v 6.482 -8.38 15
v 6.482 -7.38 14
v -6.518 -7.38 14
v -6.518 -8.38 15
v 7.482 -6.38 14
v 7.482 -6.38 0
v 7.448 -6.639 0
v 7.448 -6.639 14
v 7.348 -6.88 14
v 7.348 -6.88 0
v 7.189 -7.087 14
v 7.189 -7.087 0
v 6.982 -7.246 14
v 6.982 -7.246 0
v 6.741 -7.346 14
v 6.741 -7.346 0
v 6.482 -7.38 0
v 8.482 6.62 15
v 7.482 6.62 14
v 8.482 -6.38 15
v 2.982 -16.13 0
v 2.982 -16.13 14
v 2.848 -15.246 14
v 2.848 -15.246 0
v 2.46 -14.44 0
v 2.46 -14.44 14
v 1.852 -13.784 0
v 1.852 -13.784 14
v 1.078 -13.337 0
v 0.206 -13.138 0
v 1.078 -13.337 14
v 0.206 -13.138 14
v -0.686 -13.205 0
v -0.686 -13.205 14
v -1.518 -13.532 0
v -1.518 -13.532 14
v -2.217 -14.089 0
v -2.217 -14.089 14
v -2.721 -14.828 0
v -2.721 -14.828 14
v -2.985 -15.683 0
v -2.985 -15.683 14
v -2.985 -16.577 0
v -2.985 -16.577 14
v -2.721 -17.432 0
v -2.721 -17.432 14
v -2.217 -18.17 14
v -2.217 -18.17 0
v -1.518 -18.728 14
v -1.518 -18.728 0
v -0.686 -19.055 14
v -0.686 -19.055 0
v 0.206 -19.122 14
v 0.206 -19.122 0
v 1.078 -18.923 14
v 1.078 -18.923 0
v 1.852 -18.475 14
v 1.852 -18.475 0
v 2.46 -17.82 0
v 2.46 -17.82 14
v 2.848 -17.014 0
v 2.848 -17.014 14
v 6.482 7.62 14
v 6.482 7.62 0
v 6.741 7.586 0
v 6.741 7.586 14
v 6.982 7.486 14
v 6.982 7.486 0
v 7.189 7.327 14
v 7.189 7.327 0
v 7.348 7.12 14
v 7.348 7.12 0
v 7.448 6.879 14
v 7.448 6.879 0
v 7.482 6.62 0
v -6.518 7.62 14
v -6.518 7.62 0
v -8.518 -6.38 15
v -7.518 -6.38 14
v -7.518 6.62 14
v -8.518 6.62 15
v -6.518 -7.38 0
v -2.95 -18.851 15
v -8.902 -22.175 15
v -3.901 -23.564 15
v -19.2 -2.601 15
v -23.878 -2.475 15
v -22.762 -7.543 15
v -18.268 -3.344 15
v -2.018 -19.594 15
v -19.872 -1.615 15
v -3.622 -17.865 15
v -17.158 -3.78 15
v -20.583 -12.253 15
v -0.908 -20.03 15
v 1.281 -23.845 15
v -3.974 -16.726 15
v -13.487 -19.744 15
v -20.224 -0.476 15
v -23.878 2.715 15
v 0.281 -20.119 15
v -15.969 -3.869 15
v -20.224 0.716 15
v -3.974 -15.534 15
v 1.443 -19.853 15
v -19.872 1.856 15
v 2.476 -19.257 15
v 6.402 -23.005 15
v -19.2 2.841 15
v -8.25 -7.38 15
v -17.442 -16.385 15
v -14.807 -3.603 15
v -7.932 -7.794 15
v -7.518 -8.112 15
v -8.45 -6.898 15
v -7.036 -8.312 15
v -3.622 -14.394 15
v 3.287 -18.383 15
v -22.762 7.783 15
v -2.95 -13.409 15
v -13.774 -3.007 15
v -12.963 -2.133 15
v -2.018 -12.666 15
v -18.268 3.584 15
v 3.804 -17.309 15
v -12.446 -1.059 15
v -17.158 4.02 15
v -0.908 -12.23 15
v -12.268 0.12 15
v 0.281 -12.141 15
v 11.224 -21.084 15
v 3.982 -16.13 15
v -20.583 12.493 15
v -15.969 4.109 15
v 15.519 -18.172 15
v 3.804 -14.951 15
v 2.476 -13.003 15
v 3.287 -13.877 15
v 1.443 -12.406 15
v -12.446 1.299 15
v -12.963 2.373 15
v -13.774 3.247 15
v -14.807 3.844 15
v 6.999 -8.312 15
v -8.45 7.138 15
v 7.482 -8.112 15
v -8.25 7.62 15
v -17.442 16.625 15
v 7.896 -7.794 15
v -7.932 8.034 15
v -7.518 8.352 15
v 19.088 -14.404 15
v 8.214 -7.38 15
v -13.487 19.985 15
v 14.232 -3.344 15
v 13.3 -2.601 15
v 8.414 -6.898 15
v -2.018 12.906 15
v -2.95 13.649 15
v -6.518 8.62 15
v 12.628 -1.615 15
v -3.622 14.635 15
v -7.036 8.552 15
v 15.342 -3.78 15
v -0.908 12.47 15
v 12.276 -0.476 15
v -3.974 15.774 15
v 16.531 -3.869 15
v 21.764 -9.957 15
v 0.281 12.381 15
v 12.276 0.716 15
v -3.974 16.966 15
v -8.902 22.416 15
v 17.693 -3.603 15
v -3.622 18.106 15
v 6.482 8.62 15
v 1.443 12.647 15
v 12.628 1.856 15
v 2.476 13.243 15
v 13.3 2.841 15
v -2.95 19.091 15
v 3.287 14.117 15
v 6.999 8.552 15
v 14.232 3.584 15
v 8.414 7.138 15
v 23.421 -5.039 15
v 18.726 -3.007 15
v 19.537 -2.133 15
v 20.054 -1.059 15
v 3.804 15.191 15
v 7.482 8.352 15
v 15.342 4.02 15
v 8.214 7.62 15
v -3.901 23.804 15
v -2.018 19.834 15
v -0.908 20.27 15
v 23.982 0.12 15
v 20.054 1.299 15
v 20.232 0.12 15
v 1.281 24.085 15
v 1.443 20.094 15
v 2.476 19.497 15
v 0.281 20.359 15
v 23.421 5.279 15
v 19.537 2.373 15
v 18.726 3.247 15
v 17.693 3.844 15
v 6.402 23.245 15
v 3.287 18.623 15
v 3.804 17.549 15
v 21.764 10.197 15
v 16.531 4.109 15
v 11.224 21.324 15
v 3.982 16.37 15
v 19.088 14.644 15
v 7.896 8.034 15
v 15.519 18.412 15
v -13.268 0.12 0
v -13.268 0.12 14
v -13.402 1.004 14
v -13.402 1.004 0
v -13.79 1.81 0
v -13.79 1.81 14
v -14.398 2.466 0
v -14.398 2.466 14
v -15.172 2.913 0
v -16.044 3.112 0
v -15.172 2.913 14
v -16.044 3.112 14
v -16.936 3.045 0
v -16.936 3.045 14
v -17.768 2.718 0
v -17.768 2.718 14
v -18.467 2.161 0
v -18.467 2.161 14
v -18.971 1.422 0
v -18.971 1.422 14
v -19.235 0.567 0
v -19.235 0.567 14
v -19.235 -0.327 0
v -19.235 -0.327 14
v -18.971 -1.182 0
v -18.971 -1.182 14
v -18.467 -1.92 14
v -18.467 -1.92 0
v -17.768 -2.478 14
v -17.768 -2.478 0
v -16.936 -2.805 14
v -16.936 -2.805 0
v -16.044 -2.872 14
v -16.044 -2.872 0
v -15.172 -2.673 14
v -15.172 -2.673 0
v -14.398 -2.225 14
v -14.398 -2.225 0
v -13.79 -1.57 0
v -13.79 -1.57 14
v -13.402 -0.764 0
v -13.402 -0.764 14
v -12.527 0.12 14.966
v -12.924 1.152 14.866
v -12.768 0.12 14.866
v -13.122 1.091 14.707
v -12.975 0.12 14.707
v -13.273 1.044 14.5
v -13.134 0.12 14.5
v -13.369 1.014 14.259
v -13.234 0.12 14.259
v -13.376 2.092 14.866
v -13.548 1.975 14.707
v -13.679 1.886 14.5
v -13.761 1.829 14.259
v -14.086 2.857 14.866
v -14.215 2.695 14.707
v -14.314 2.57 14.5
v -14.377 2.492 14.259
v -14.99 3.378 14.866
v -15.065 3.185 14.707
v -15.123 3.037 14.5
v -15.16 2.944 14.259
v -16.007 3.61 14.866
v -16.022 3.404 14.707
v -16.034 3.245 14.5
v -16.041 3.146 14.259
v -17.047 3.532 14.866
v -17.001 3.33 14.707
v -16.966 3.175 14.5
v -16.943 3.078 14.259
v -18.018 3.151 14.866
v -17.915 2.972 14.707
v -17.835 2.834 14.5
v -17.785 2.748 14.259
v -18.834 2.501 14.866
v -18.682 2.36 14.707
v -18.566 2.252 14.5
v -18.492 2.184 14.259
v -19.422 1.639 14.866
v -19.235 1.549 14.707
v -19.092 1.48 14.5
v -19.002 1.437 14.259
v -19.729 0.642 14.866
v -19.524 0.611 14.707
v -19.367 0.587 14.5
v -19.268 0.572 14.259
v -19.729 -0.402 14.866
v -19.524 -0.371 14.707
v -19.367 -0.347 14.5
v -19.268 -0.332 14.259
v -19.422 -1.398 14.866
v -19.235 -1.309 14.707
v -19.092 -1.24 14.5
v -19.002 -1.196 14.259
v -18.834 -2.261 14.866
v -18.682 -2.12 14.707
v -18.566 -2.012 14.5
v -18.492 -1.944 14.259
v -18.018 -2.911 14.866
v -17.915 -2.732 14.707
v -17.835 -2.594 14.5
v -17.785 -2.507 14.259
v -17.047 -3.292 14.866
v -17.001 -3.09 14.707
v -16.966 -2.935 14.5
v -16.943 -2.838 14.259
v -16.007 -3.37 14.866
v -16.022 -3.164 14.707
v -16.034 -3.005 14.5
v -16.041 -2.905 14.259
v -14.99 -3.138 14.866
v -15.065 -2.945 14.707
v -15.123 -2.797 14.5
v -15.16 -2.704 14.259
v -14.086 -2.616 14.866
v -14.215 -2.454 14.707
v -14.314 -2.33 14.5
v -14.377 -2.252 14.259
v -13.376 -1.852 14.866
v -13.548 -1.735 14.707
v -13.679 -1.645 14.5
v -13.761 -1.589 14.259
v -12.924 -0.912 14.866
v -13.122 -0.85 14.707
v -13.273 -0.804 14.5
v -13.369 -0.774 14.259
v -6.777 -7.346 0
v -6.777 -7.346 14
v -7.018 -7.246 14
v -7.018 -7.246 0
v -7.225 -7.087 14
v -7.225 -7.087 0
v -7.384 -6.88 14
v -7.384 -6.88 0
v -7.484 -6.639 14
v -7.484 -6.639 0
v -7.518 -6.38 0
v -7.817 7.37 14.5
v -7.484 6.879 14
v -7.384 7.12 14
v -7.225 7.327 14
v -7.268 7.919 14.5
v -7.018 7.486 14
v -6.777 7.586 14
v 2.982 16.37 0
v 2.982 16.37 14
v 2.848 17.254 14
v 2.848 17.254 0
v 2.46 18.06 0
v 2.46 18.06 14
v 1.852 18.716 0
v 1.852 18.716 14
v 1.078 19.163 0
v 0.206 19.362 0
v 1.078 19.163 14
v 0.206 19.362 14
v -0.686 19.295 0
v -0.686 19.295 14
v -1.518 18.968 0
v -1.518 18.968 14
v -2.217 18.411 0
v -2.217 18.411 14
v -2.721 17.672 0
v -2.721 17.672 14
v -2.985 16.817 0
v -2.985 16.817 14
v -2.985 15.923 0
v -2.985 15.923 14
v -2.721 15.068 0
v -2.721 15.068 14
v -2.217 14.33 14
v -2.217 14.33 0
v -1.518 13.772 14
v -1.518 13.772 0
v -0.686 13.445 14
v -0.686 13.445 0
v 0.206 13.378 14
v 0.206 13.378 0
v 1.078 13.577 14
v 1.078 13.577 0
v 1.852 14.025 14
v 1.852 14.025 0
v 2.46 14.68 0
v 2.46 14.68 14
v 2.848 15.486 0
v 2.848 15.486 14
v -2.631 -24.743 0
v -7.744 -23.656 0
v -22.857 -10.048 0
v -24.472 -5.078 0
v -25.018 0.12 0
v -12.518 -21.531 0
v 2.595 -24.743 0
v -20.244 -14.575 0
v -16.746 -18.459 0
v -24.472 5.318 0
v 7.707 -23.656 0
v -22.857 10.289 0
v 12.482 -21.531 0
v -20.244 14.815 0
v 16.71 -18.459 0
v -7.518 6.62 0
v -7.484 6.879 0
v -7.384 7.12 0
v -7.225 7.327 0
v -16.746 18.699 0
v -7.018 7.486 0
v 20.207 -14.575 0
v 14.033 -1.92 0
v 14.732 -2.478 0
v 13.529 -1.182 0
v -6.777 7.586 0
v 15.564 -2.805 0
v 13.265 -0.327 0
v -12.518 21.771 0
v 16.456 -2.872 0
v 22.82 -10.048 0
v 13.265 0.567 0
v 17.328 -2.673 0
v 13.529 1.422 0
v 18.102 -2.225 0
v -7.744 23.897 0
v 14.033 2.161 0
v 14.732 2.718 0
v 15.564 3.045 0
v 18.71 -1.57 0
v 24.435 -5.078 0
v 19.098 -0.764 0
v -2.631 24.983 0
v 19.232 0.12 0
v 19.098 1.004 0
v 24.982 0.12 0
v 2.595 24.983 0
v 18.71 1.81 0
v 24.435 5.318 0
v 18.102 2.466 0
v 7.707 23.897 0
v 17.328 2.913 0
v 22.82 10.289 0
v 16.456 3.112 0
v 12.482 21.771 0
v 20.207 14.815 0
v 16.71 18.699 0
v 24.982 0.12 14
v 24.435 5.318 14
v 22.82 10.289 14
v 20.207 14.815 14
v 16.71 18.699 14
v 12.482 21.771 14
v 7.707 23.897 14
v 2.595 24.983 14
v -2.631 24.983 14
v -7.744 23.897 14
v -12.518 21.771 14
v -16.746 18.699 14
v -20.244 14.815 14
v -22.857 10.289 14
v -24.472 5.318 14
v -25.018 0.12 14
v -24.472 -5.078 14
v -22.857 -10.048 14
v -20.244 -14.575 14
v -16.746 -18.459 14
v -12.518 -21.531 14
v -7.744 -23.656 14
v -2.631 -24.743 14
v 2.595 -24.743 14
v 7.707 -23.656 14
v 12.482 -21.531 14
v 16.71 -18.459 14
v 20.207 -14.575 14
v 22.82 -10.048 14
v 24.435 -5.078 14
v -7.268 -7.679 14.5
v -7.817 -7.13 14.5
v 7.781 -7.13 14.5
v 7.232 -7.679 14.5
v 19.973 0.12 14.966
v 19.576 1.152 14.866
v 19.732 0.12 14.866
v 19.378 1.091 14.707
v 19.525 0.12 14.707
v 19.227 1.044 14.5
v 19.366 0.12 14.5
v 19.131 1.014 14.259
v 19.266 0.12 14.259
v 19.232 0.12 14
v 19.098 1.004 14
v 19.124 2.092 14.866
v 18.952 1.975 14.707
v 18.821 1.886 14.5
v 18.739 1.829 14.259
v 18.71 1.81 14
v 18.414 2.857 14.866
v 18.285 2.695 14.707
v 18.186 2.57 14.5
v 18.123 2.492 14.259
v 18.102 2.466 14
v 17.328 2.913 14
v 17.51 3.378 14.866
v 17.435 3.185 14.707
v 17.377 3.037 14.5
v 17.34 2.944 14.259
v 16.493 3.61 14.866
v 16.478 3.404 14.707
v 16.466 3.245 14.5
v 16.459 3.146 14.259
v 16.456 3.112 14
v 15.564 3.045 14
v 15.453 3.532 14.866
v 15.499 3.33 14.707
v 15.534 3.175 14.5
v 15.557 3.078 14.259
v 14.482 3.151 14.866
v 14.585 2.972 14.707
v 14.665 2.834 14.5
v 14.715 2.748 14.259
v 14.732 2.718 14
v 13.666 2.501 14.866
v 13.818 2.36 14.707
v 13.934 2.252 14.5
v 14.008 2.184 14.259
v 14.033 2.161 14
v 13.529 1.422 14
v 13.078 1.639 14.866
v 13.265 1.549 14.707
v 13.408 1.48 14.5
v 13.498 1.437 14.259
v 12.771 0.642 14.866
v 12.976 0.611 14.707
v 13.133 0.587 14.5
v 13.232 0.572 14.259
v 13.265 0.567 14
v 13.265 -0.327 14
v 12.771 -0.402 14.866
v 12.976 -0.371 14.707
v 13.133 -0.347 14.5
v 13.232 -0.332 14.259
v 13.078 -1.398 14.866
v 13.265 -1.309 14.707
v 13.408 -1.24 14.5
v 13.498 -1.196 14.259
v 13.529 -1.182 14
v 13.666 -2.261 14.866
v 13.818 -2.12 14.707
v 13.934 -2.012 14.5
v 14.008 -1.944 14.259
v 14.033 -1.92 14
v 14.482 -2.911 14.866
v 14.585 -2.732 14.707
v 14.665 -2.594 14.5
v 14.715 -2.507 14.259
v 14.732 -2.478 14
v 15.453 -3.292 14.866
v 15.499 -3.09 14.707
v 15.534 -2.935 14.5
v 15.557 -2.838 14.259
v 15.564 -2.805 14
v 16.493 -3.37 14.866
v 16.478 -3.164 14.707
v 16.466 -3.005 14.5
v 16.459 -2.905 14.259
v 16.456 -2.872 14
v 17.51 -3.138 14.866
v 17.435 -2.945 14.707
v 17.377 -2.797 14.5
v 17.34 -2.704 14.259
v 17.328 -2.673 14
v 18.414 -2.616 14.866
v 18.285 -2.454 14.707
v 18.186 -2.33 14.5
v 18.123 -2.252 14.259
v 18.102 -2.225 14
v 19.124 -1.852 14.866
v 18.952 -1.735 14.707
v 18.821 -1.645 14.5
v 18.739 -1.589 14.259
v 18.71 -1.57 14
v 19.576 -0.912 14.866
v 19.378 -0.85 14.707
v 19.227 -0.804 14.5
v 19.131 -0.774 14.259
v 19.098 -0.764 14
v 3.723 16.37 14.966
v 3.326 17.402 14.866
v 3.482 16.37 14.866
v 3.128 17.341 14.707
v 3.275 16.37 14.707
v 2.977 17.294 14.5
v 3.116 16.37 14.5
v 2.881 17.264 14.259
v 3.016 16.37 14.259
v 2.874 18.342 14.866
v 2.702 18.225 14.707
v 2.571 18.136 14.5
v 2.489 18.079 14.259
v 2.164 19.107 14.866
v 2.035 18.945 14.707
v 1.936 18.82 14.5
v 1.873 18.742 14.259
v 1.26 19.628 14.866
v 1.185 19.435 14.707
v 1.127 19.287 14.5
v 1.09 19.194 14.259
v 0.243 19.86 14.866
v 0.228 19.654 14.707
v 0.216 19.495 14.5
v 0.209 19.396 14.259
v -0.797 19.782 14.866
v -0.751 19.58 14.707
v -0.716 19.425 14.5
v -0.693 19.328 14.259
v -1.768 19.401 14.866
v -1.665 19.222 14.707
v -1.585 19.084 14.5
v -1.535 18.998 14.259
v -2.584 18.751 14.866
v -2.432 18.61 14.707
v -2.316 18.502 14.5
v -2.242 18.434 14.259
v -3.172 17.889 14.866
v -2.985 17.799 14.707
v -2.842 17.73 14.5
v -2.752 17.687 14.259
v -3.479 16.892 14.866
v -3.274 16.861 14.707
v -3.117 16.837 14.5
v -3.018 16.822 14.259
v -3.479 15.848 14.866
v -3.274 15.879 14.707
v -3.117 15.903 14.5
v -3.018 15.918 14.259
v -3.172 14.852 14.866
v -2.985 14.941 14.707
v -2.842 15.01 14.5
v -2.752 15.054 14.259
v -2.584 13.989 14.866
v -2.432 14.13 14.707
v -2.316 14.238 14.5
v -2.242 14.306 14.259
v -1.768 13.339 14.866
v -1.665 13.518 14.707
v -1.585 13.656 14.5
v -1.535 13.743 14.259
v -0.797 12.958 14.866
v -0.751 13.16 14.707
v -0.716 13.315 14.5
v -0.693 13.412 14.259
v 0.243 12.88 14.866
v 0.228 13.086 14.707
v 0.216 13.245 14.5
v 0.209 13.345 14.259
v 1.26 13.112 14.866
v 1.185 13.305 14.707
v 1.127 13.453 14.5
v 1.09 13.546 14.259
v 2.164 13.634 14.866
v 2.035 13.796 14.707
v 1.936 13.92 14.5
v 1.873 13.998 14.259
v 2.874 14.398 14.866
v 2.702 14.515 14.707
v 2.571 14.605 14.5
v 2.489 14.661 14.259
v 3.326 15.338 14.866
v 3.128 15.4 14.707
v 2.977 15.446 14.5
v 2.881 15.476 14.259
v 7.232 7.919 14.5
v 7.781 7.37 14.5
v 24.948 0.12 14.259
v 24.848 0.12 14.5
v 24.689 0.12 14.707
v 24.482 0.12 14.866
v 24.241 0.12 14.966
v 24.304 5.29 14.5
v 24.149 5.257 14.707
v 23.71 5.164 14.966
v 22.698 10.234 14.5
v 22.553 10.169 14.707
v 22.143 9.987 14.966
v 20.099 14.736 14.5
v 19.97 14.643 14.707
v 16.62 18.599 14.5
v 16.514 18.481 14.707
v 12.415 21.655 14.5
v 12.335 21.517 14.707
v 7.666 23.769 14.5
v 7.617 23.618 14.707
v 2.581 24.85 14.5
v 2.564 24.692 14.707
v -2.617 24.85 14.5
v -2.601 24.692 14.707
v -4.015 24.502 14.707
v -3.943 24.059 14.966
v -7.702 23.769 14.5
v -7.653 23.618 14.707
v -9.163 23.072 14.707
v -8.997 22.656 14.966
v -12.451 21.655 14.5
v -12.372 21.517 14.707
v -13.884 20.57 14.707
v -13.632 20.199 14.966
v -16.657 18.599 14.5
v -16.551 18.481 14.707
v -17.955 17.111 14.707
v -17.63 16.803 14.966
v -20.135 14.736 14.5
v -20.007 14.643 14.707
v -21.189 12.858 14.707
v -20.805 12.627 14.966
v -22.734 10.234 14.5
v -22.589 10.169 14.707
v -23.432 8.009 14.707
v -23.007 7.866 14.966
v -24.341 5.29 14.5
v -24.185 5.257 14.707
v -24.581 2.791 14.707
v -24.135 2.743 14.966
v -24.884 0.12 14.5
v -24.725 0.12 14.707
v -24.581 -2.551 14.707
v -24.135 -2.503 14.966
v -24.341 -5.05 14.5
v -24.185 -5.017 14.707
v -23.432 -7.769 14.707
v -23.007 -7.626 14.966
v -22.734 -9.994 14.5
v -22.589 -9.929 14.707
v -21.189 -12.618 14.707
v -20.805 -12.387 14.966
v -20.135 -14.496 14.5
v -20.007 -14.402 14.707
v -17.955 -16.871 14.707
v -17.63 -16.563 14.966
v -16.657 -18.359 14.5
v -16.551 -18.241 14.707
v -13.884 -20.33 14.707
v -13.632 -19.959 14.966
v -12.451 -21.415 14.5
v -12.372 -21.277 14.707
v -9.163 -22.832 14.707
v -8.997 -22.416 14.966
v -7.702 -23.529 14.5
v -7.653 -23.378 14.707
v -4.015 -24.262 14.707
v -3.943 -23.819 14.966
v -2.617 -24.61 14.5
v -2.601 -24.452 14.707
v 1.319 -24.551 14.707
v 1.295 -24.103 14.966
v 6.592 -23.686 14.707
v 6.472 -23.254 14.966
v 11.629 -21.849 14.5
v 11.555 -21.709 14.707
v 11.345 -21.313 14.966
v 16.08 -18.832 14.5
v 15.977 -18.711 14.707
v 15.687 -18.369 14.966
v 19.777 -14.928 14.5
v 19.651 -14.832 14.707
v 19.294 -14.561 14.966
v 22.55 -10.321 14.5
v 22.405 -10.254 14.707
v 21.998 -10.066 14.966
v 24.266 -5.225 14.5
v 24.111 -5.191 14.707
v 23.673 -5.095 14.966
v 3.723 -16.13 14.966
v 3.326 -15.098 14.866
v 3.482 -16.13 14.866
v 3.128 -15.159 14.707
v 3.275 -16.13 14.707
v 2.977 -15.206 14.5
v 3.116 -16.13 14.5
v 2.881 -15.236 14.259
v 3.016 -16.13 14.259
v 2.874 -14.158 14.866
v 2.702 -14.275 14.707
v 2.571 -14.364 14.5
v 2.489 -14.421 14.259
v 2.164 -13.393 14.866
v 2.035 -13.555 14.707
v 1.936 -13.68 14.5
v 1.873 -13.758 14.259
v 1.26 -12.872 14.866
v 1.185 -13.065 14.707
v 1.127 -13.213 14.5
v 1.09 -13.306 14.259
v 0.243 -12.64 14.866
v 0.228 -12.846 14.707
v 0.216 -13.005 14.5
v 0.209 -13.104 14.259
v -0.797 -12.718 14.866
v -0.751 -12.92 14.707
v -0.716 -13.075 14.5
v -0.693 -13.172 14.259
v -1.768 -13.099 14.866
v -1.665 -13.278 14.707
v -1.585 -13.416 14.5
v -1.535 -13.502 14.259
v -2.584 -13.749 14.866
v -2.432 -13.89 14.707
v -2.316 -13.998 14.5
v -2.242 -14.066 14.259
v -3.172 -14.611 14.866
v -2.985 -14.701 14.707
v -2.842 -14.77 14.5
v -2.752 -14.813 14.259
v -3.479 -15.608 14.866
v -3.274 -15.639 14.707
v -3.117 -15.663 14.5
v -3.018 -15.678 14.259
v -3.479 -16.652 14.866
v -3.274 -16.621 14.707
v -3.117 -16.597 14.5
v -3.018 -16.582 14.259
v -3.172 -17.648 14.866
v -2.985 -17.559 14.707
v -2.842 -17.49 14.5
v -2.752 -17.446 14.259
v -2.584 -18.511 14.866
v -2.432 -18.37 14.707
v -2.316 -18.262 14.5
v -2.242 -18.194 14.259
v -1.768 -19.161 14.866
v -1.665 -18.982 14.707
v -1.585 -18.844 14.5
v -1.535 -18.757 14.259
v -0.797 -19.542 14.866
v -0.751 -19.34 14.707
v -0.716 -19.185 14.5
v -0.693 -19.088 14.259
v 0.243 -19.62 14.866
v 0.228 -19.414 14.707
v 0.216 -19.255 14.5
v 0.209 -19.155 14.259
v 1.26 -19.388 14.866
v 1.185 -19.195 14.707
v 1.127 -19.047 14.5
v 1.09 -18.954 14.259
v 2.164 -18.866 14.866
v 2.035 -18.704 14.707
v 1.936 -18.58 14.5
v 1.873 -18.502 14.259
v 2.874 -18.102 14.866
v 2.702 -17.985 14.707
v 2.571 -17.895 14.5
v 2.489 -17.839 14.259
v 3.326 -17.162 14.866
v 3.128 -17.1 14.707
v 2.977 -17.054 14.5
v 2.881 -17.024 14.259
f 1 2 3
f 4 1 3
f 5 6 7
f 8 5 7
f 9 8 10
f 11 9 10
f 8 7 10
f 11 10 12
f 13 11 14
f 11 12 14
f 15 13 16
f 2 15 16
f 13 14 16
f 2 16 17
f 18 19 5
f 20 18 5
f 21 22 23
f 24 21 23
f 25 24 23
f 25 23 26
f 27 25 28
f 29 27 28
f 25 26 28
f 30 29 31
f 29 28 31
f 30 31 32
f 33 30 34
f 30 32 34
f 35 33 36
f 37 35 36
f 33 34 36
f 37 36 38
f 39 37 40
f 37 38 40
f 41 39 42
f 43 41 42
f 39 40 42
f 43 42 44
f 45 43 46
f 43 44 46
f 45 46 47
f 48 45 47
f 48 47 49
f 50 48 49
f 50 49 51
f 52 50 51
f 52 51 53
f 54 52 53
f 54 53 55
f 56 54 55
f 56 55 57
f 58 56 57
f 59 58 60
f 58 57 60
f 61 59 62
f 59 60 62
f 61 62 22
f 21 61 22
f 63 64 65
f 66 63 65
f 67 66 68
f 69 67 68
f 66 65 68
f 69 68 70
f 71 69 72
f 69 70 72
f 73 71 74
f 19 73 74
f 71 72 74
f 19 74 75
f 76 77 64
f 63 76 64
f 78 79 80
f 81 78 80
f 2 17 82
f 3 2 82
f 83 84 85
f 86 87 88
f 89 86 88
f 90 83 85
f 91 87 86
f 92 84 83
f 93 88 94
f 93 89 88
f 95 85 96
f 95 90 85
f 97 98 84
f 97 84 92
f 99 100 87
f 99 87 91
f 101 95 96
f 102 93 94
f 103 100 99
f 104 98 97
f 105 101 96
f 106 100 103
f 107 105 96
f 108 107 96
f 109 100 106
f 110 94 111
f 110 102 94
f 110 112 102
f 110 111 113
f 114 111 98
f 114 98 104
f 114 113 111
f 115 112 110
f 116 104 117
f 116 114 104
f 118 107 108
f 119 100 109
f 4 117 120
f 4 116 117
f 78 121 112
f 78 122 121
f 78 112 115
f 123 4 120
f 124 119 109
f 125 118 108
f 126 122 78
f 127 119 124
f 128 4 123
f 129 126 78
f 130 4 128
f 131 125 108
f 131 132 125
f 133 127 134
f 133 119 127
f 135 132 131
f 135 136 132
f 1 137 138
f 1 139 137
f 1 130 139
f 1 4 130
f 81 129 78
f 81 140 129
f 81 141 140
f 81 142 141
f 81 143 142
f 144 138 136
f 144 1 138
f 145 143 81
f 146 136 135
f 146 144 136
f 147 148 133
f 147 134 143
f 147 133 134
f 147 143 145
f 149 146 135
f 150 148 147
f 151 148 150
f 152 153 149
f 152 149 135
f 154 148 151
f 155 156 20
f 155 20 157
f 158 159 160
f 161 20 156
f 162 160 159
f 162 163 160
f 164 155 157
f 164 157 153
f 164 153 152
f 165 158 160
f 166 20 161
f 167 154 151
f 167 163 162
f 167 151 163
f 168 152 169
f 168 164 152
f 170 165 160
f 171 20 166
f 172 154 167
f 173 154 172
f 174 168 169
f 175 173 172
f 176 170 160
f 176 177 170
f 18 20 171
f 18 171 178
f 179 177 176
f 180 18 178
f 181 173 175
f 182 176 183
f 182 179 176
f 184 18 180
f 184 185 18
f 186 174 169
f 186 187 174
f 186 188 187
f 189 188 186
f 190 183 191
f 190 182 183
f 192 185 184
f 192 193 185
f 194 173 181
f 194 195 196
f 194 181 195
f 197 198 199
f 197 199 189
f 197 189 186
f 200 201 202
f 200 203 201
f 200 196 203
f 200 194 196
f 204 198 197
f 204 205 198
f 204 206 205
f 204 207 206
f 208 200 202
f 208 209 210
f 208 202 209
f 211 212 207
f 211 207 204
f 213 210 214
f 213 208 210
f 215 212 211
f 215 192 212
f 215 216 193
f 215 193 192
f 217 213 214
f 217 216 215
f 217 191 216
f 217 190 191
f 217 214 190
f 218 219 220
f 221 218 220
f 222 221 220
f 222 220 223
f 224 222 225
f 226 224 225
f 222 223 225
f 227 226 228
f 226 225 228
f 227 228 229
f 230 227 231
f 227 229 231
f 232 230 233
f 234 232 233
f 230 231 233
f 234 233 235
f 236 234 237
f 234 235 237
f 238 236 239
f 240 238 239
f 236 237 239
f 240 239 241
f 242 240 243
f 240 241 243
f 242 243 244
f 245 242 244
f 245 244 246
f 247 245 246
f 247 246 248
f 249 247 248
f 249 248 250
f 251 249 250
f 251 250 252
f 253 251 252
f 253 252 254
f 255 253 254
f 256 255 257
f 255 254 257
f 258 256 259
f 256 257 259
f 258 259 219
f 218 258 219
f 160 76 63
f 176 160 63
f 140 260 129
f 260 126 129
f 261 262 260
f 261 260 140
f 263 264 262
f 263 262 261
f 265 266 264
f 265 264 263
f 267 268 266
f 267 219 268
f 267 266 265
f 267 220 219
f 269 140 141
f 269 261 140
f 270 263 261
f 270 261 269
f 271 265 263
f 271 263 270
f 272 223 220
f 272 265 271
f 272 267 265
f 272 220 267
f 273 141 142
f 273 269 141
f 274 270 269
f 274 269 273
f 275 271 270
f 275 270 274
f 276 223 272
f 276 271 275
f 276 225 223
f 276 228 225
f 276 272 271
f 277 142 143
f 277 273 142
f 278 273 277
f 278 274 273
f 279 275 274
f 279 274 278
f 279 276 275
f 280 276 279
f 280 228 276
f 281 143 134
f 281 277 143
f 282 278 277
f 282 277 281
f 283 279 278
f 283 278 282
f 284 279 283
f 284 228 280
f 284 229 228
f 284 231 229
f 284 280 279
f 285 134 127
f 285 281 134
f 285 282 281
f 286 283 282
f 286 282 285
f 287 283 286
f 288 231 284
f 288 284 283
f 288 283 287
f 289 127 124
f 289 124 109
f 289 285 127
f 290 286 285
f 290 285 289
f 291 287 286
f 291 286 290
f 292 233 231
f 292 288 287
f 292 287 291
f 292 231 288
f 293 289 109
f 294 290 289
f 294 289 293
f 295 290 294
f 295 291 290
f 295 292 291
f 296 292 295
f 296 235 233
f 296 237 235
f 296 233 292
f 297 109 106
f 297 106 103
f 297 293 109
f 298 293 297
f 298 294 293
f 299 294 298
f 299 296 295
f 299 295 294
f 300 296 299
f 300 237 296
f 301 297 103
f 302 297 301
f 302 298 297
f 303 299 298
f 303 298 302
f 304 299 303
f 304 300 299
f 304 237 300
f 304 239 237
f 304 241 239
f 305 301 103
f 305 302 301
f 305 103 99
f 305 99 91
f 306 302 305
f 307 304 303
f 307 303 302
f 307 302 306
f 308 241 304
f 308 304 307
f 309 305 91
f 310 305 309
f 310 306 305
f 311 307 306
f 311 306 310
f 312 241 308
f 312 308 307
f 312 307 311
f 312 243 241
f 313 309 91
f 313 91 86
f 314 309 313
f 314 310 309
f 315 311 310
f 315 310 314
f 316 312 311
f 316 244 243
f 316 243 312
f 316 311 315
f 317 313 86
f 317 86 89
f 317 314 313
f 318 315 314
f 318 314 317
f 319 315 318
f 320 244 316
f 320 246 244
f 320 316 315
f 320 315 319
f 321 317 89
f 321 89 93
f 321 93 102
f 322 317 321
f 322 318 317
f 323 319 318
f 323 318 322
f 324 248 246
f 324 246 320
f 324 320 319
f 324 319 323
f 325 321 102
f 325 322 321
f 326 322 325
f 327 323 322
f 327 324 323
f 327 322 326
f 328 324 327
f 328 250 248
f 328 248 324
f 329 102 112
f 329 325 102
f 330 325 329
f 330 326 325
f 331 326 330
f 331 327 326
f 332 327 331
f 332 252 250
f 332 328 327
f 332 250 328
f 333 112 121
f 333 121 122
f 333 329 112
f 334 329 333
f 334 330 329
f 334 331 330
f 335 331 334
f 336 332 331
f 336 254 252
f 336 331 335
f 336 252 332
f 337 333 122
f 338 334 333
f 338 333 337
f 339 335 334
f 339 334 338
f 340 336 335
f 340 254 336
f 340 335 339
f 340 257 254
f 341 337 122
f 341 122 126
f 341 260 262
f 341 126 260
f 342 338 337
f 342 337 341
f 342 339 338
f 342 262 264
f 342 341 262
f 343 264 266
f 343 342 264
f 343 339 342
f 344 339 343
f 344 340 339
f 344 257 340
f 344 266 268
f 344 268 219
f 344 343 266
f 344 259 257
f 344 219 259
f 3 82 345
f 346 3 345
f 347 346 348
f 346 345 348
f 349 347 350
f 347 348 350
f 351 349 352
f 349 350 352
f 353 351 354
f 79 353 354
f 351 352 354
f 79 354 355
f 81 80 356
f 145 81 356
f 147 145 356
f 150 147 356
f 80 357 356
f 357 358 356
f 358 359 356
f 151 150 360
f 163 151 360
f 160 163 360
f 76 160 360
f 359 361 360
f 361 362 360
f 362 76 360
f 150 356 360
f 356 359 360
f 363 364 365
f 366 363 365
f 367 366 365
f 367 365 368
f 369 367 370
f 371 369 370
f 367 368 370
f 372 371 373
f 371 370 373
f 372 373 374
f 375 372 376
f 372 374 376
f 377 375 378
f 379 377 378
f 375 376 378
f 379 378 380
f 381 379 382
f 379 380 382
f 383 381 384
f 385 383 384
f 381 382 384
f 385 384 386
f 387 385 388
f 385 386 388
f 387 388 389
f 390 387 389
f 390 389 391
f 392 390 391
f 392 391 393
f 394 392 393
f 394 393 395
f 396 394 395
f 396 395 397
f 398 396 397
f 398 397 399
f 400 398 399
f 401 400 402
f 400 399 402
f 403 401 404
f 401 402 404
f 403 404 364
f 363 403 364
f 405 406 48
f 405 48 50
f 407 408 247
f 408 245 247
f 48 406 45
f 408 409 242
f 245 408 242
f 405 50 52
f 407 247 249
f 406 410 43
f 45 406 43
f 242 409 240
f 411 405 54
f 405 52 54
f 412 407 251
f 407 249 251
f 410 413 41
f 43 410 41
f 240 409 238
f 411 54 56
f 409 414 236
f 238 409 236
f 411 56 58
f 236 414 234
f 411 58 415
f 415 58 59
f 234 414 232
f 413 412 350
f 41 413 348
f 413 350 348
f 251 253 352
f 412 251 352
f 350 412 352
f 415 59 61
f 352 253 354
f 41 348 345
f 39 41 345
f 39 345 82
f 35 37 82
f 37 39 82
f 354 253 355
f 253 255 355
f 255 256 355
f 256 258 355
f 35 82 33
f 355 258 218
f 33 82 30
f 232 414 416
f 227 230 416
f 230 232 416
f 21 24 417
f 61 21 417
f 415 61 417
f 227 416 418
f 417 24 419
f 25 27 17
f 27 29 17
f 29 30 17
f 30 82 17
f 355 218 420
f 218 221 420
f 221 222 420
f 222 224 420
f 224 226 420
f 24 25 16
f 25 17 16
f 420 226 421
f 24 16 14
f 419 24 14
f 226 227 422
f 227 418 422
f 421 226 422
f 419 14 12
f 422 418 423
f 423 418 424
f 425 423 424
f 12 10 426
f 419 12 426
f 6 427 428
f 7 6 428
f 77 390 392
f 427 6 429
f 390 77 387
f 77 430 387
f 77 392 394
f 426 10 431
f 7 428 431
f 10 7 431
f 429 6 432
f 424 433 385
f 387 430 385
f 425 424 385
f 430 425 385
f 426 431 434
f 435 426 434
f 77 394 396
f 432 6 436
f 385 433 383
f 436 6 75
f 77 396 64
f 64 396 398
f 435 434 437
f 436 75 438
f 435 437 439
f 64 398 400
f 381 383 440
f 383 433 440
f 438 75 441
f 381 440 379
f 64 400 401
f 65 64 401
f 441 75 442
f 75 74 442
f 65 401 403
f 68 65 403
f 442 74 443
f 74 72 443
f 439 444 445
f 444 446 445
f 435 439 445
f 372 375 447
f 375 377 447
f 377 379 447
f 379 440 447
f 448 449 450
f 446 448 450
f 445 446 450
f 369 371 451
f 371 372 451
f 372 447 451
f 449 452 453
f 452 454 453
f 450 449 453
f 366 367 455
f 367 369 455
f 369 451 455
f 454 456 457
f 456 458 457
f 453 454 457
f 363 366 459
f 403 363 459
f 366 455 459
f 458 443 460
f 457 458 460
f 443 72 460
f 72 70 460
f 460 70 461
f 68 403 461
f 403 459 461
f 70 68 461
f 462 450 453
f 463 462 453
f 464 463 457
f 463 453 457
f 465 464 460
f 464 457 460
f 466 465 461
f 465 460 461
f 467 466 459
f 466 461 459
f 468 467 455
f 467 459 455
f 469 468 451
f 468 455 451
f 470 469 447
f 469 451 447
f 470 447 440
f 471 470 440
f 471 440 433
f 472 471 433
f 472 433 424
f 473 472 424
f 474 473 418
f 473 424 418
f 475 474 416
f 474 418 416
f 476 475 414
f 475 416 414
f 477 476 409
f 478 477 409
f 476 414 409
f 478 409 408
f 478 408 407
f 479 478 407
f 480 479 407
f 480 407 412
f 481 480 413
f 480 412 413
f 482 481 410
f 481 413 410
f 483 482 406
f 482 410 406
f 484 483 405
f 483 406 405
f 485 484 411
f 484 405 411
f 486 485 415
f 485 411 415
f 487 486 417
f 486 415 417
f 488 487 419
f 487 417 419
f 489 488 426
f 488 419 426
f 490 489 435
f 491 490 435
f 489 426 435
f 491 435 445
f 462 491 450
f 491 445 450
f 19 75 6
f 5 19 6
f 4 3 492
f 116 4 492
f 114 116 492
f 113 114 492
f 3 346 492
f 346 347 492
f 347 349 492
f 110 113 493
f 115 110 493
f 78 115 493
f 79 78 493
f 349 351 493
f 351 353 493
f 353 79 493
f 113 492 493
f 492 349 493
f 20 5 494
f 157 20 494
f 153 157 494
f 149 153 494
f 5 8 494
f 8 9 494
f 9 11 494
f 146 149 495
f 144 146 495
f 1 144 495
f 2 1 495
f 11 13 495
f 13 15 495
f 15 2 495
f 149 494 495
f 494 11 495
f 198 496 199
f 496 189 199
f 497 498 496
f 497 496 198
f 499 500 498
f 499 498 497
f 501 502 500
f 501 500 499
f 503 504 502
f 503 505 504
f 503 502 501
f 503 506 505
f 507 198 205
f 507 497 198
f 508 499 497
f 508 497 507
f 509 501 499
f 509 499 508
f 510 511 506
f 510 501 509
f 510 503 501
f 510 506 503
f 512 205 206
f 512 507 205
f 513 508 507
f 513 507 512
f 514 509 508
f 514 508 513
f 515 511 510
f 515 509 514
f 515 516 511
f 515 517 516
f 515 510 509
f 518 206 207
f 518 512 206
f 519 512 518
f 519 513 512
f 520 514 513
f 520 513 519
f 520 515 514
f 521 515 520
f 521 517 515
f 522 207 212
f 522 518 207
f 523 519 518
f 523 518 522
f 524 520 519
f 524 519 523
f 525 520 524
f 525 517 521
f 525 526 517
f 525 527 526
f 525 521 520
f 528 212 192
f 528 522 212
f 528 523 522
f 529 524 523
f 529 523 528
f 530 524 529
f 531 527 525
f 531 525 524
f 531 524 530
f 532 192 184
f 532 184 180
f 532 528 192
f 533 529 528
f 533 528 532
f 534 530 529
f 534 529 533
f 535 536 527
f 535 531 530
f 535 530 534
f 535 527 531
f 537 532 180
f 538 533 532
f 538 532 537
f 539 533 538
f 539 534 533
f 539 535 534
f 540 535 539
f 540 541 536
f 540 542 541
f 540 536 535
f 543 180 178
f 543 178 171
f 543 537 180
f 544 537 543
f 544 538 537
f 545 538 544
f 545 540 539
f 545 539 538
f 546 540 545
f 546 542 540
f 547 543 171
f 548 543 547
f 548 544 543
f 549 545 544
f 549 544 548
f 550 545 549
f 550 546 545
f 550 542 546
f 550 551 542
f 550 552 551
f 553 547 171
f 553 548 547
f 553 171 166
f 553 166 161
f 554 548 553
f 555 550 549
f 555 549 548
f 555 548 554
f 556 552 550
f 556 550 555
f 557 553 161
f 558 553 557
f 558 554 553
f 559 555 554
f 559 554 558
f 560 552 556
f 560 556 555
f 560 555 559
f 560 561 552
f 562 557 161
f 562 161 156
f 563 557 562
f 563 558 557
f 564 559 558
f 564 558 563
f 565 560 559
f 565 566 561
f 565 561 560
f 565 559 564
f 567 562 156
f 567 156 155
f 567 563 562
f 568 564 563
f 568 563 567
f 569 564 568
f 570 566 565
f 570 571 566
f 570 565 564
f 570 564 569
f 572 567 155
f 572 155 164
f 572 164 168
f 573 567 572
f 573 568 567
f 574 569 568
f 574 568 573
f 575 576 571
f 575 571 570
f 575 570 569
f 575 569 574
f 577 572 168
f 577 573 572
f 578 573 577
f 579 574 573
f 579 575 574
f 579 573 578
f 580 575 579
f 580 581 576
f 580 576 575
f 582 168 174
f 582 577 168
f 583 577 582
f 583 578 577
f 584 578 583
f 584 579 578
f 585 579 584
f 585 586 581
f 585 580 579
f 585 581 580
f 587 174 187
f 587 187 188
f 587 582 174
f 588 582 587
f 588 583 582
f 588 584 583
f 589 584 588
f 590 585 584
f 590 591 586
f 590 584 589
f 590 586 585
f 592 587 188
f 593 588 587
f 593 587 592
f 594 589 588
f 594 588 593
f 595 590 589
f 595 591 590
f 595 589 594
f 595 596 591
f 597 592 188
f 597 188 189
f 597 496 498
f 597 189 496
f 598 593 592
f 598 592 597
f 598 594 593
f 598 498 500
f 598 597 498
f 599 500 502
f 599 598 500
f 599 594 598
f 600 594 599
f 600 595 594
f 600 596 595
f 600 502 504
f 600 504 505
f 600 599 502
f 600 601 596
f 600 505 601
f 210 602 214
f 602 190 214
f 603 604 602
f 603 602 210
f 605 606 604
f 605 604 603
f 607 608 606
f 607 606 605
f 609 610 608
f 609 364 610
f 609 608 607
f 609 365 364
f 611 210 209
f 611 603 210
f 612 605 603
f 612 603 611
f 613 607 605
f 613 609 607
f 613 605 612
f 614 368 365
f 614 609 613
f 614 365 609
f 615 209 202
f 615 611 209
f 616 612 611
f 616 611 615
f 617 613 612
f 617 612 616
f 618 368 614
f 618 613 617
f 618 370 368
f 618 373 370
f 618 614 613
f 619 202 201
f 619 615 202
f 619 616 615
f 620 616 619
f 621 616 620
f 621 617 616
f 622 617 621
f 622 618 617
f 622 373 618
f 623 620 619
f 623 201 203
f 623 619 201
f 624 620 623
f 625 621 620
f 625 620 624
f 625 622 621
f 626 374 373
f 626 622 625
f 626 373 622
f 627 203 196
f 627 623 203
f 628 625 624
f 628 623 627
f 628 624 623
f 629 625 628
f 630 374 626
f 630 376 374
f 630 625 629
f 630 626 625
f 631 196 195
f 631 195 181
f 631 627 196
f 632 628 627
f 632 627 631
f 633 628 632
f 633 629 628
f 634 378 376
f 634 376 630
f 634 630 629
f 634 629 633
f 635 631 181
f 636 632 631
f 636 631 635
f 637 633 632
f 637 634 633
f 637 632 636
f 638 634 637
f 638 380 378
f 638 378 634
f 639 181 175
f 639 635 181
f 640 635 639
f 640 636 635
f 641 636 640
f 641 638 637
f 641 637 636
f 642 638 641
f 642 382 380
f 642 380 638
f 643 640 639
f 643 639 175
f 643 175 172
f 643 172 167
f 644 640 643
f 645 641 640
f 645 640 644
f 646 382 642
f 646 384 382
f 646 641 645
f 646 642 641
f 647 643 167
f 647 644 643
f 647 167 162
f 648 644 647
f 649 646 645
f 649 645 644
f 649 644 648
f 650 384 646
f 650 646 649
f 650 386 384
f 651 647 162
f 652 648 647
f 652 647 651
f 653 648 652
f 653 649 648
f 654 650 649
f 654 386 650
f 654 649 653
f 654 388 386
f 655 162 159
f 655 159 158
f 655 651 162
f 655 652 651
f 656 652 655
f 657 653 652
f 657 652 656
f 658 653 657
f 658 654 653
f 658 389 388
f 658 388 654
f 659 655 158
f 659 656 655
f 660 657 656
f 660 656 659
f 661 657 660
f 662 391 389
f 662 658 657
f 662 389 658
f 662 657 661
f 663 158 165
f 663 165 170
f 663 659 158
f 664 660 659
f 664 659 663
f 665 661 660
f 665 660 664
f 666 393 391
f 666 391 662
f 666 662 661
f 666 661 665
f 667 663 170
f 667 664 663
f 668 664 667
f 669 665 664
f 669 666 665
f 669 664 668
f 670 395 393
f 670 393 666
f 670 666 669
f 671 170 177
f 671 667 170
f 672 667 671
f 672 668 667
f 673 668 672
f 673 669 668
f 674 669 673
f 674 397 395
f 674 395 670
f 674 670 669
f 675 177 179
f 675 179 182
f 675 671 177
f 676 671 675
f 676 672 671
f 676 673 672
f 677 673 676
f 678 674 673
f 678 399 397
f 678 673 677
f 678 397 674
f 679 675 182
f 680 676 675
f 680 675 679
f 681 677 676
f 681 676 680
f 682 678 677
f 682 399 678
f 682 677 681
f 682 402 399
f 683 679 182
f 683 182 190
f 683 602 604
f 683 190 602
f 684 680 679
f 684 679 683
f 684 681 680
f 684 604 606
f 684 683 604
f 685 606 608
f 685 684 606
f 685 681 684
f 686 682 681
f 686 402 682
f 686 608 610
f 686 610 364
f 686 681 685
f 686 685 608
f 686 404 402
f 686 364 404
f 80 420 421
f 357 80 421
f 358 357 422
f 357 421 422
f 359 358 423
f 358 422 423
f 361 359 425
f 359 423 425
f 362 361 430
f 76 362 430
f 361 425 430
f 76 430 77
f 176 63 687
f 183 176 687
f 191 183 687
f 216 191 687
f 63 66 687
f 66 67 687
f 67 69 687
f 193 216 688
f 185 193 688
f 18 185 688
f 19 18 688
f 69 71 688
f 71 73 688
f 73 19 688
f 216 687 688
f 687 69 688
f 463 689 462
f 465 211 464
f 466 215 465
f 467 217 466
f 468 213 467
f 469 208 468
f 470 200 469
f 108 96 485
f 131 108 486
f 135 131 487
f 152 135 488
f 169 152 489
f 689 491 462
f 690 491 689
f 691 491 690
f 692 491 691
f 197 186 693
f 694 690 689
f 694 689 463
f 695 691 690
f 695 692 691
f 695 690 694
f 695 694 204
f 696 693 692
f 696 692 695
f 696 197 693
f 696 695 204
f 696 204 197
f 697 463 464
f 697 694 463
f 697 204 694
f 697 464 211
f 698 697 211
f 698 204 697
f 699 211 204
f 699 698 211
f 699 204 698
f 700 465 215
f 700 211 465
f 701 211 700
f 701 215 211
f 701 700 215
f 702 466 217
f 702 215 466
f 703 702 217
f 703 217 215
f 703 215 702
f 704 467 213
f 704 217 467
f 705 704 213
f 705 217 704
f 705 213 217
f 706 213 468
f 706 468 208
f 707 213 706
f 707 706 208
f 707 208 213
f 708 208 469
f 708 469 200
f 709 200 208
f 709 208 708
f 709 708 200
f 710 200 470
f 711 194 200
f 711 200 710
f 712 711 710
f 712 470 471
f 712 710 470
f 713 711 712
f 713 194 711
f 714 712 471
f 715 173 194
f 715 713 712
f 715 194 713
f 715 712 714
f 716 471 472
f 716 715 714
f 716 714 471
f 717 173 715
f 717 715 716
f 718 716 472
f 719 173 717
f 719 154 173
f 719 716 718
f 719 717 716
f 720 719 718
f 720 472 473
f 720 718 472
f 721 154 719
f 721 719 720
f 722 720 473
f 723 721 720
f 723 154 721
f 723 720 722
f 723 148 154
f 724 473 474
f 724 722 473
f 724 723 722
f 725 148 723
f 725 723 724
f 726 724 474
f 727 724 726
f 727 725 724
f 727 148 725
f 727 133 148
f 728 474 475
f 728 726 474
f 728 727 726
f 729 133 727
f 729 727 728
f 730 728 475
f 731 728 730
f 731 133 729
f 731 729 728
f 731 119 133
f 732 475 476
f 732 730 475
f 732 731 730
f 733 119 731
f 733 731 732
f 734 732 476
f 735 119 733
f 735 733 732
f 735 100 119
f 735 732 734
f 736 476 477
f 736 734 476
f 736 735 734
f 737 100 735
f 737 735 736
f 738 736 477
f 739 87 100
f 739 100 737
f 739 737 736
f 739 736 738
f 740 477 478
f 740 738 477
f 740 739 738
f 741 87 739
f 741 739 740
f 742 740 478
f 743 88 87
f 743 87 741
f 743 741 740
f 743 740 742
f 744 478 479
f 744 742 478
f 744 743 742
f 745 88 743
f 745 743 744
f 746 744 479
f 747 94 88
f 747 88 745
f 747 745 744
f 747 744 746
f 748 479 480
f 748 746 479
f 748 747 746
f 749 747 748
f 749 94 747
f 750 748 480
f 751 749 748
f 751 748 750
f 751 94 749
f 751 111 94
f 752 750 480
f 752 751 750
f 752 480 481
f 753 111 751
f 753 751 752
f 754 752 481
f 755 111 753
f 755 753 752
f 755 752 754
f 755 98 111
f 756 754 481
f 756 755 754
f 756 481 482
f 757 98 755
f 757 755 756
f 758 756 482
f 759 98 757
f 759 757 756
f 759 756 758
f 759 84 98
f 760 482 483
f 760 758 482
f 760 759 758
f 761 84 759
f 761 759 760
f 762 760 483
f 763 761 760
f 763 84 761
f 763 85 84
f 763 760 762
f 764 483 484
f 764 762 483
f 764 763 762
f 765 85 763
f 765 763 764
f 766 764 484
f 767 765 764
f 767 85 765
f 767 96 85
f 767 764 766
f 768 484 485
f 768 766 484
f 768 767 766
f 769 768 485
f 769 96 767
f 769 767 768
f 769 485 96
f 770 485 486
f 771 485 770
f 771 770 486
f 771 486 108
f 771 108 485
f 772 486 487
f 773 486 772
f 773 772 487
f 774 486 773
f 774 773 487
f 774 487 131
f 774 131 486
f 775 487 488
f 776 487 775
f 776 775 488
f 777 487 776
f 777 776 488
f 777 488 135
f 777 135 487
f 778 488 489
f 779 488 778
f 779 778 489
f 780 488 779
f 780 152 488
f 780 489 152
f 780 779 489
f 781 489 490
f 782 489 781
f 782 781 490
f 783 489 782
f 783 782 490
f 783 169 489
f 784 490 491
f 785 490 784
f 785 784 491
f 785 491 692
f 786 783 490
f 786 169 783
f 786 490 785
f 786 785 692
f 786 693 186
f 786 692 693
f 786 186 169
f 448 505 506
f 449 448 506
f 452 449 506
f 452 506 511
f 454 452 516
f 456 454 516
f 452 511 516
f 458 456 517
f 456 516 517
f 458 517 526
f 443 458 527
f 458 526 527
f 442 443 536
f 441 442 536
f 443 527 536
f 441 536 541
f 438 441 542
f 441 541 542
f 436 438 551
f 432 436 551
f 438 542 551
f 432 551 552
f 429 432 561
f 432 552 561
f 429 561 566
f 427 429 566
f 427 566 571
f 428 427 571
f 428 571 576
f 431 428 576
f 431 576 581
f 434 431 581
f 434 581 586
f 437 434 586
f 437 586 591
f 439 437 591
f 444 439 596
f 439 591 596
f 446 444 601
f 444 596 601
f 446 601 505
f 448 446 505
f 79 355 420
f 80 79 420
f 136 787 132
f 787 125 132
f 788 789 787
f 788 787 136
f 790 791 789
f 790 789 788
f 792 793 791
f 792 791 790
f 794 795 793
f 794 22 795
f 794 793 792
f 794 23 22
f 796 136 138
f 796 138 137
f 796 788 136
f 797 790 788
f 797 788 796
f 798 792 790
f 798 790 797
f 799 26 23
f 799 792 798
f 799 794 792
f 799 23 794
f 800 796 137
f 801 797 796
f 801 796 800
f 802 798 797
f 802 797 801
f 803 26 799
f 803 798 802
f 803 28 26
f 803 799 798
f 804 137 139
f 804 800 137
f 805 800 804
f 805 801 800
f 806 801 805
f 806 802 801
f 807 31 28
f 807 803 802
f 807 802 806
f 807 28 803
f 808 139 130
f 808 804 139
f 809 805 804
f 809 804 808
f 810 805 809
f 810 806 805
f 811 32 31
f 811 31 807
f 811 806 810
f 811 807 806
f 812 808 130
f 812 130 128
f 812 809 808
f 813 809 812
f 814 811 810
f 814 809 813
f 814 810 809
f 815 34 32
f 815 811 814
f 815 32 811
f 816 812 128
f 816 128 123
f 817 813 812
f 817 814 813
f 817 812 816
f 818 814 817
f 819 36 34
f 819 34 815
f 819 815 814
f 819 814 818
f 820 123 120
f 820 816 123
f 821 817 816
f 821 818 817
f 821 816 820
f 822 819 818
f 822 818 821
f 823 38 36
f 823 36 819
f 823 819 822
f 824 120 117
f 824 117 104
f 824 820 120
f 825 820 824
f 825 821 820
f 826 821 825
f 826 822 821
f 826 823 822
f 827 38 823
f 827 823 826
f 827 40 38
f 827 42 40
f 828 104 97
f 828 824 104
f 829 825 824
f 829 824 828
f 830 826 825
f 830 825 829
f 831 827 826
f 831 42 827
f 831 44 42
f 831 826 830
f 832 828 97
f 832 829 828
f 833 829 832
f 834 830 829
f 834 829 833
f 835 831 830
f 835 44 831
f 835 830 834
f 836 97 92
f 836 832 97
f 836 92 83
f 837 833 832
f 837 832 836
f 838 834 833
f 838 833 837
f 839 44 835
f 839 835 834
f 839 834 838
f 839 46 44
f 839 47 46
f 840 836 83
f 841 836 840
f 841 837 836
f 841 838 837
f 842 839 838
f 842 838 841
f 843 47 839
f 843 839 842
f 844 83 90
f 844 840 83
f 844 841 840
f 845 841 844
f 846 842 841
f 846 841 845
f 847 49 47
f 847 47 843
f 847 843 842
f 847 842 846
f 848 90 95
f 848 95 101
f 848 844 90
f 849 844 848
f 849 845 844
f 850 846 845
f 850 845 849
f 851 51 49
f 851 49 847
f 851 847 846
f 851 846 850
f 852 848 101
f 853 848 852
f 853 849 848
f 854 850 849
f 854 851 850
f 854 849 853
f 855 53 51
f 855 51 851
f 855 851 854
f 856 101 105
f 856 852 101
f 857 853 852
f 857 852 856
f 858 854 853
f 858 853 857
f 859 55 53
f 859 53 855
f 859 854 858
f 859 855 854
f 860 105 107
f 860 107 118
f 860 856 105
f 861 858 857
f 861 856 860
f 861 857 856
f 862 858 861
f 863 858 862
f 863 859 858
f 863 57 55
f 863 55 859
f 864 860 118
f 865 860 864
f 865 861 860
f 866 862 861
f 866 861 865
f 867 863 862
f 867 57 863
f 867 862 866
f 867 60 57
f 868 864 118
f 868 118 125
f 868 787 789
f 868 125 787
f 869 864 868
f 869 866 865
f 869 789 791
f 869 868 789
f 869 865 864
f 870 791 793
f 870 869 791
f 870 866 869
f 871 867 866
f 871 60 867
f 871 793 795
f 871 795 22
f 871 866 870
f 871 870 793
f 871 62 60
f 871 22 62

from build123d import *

# Parameters (mm, degrees)
F0_R     = 25
F1_DEPTH = 15
F2_R     = 3
F3_DEPTH = 15
F4_R     = 1
F5_SIZE  = 1


with BuildPart() as f1:
    # F0 (on Top) → F1 (new body)
    with BuildSketch(Plane.XY):
        with Locations((-0.018229, 0.1201)):
            Circle(F0_R)
        with BuildLine():
            Line((6.481771, -7.3799), (-6.518229, -7.3799))
            ThreePointArc((-6.518229, -7.3799), (-7.225335, -7.087007), (-7.518229, -6.3799))
            Line((-7.518229, -6.3799), (-7.518229, 6.6201))
            ThreePointArc((-7.518229, 6.6201), (-7.225335, 7.327207), (-6.518229, 7.6201))
            Line((-6.518229, 7.6201), (6.481771, 7.6201))
            ThreePointArc((6.481771, 7.6201), (7.188878, 7.327207), (7.481771, 6.6201))
            Line((7.481771, 6.6201), (7.481771, -6.3799))
            ThreePointArc((7.481771, -6.3799), (7.188878, -7.087007), (6.481771, -7.3799))
        make_face(mode=Mode.SUBTRACT)
    extrude(amount=F1_DEPTH)

    # F2 (on face) → F3 (cut)
    with BuildSketch(Plane.XY.offset(15)):
        with Locations((-0.018229, -16.1299)):
            Circle(F2_R)
        with Locations((16.231771, 0.1201)):
            Circle(F2_R)
        with Locations((-0.018229, 16.3701)):
            Circle(F2_R)
        with Locations((-16.268229, 0.1201)):
            Circle(F2_R)
    extrude(amount=-F3_DEPTH, mode=Mode.SUBTRACT)

    # F4
    f4_edges = [f1.edges().sort_by_distance(p)[0] for p in [
        (-25.018229, 0.1201, 15),
        (-19.268229, 0.1201, 15),
        (-3.018229, 16.3701, 15),
        (-3.018229, -16.1299, 15),
        (13.231771, 0.1201, 15),
    ]]
    fillet(f4_edges, radius=F4_R)

    # F5
    f5_edges = [f1.edges().sort_by_distance(p)[0] for p in [
        (-0.018229, -7.3799, 15),
        (7.481771, 0.1201, 15),
        (-0.018229, 7.6201, 15),
        (-7.518229, 0.1201, 15),
    ]]
    chamfer(f5_edges, length=F5_SIZE)


solid = f1.part
